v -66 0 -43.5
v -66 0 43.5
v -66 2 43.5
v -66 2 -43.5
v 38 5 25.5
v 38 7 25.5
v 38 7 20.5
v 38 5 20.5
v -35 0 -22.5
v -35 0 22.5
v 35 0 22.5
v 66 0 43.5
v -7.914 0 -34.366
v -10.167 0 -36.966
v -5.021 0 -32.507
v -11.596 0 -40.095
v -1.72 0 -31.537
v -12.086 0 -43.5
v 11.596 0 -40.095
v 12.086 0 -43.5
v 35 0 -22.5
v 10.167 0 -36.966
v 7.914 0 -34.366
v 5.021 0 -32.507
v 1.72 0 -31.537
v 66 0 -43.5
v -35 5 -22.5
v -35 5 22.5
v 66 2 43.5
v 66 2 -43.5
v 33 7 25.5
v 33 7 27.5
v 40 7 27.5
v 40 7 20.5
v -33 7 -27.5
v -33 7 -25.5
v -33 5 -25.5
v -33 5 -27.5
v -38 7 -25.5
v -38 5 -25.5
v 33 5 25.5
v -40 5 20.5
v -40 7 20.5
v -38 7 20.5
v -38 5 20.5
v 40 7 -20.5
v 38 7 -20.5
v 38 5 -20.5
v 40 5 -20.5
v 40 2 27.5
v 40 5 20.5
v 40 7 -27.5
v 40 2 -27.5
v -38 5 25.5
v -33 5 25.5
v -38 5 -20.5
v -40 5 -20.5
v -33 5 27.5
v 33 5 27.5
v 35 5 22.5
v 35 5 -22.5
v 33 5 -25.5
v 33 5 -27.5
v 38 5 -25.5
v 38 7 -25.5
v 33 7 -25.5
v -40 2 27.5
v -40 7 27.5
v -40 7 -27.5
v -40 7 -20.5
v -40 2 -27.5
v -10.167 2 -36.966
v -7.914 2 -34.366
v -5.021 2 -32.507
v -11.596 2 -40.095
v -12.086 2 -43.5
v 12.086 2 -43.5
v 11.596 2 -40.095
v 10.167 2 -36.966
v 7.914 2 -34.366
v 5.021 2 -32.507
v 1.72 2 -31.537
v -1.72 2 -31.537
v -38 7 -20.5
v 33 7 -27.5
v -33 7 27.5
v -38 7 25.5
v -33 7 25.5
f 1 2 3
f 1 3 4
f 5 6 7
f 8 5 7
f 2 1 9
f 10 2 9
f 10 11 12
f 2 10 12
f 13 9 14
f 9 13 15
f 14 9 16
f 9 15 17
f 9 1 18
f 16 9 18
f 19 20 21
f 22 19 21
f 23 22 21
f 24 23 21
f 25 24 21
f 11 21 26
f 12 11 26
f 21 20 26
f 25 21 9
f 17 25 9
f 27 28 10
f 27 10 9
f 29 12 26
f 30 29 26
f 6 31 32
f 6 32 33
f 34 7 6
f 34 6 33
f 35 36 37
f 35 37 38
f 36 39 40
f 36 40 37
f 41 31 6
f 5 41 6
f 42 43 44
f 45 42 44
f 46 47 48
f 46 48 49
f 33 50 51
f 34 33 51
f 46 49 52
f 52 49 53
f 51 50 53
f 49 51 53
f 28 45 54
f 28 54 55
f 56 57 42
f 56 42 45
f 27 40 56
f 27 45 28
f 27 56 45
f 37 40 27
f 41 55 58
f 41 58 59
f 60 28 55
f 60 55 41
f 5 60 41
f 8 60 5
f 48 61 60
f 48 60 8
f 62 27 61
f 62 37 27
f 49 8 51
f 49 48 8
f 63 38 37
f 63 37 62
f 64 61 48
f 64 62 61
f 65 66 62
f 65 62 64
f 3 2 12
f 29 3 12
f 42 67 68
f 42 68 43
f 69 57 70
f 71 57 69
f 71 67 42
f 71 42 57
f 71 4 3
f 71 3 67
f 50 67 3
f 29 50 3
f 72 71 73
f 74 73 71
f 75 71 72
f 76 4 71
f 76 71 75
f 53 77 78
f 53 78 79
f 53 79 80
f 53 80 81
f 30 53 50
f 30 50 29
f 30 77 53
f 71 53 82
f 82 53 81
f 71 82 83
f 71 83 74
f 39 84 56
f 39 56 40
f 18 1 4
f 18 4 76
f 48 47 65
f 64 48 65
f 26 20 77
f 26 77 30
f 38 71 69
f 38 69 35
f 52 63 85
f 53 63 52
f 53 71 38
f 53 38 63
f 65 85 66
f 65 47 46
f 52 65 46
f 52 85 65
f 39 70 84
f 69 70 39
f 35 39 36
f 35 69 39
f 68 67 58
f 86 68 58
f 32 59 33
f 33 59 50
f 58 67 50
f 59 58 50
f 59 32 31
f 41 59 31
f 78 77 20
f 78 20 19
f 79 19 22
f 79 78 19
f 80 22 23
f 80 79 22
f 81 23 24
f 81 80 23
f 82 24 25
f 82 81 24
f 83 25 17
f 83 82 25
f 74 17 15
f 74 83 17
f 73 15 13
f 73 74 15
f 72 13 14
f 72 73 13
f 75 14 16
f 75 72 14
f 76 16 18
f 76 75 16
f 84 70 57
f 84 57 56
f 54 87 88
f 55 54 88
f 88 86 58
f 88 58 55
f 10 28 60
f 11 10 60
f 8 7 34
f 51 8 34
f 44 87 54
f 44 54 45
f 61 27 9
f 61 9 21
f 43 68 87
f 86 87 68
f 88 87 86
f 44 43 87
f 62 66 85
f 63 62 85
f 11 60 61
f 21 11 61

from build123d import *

# Parameters (mm, degrees)
SKETCH1_W           = 132
SKETCH1_H           = 87
BOSS_EXTRUDE1_DEPTH = 2
SKETCH2_W           = 80
SKETCH2_H           = 55
BOSS_EXTRUDE2_DEPTH = 5
SKETCH3_W           = 76
SKETCH3_H           = 51
CUT_EXTRUDE1_DEPTH  = 2
CUT_EXTRUDE2_REACH  = 7
SKETCH4_W           = 70
SKETCH4_H           = 45
SKETCH5_W           = 2
SKETCH5_H           = 41
SKETCH5_W_2         = 66
SKETCH5_H_2         = 2
CUT_EXTRUDE3_DEPTH  = 2
CUT_EXTRUDE4_DEPTH  = 2


with BuildPart() as part:
    # Sketch1 → Boss-Extrude1 (new body)
    with BuildSketch(Plane(origin=(0, 0, 0), x_dir=(1, 0, 0), z_dir=(0, 1, 0))):
        Rectangle(SKETCH1_W, SKETCH1_H)
    extrude(amount=BOSS_EXTRUDE1_DEPTH)

    # Sketch2 → Boss-Extrude2 (add)
    with BuildSketch(Plane(origin=(0, 2, 0), x_dir=(1, 0, 0), z_dir=(0, 1, 0))):
        Rectangle(SKETCH2_W, SKETCH2_H)
    extrude(amount=BOSS_EXTRUDE2_DEPTH)

    # Sketch3 → Cut-Extrude1 (cut)
    with BuildSketch(Plane(origin=(0, 7, 0), x_dir=(1, 0, 0), z_dir=(0, 1, 0))):
        Rectangle(SKETCH3_W, SKETCH3_H)
    extrude(amount=-CUT_EXTRUDE1_DEPTH, mode=Mode.SUBTRACT)

    # Sketch4 → Cut-Extrude2 (cut, up to next)
    with BuildSketch(Plane(origin=(0, 5, 0), x_dir=(1, 0, 0), z_dir=(0, 1, 0)), mode=Mode.PRIVATE) as cut_extrude2_sk1:
        Rectangle(SKETCH4_W, SKETCH4_H)
    cut_extrude2_tool1 = extrude(cut_extrude2_sk1.sketch, amount=-CUT_EXTRUDE2_REACH, mode=Mode.PRIVATE) & part.part
    add(cut_extrude2_tool1.solids().sort_by_distance((0, 5, 0))[0], mode=Mode.SUBTRACT)

    # Sketch5 → Cut-Extrude3 (cut)
    with BuildSketch(Plane(origin=(0, 7, 0), x_dir=(1, 0, 0), z_dir=(0, 1, 0))):
        with Locations((-39, 0)):
            Rectangle(SKETCH5_W, SKETCH5_H)
        with Locations((39, 0)):
            Rectangle(SKETCH5_W, SKETCH5_H)
        with Locations((0, 26.5)):
            Rectangle(SKETCH5_W_2, SKETCH5_H_2)
        with Locations((0, -26.5)):
            Rectangle(SKETCH5_W_2, SKETCH5_H_2)
    extrude(amount=-CUT_EXTRUDE3_DEPTH, mode=Mode.SUBTRACT)

    # Sketch6 → Cut-Extrude4 (cut)
    with BuildSketch(Plane(origin=(0, 2, 0), x_dir=(1, 0, 0), z_dir=(0, 1, 0))):
        with BuildLine():
            Line((-12.085608445, 43.5), (12.085608445, 43.5))
            ThreePointArc((12.085608445, 43.5), (0, 31.414391555), (-12.085608445, 43.5))
        make_face()
    extrude(amount=-CUT_EXTRUDE4_DEPTH, mode=Mode.SUBTRACT)


solid = part.part
